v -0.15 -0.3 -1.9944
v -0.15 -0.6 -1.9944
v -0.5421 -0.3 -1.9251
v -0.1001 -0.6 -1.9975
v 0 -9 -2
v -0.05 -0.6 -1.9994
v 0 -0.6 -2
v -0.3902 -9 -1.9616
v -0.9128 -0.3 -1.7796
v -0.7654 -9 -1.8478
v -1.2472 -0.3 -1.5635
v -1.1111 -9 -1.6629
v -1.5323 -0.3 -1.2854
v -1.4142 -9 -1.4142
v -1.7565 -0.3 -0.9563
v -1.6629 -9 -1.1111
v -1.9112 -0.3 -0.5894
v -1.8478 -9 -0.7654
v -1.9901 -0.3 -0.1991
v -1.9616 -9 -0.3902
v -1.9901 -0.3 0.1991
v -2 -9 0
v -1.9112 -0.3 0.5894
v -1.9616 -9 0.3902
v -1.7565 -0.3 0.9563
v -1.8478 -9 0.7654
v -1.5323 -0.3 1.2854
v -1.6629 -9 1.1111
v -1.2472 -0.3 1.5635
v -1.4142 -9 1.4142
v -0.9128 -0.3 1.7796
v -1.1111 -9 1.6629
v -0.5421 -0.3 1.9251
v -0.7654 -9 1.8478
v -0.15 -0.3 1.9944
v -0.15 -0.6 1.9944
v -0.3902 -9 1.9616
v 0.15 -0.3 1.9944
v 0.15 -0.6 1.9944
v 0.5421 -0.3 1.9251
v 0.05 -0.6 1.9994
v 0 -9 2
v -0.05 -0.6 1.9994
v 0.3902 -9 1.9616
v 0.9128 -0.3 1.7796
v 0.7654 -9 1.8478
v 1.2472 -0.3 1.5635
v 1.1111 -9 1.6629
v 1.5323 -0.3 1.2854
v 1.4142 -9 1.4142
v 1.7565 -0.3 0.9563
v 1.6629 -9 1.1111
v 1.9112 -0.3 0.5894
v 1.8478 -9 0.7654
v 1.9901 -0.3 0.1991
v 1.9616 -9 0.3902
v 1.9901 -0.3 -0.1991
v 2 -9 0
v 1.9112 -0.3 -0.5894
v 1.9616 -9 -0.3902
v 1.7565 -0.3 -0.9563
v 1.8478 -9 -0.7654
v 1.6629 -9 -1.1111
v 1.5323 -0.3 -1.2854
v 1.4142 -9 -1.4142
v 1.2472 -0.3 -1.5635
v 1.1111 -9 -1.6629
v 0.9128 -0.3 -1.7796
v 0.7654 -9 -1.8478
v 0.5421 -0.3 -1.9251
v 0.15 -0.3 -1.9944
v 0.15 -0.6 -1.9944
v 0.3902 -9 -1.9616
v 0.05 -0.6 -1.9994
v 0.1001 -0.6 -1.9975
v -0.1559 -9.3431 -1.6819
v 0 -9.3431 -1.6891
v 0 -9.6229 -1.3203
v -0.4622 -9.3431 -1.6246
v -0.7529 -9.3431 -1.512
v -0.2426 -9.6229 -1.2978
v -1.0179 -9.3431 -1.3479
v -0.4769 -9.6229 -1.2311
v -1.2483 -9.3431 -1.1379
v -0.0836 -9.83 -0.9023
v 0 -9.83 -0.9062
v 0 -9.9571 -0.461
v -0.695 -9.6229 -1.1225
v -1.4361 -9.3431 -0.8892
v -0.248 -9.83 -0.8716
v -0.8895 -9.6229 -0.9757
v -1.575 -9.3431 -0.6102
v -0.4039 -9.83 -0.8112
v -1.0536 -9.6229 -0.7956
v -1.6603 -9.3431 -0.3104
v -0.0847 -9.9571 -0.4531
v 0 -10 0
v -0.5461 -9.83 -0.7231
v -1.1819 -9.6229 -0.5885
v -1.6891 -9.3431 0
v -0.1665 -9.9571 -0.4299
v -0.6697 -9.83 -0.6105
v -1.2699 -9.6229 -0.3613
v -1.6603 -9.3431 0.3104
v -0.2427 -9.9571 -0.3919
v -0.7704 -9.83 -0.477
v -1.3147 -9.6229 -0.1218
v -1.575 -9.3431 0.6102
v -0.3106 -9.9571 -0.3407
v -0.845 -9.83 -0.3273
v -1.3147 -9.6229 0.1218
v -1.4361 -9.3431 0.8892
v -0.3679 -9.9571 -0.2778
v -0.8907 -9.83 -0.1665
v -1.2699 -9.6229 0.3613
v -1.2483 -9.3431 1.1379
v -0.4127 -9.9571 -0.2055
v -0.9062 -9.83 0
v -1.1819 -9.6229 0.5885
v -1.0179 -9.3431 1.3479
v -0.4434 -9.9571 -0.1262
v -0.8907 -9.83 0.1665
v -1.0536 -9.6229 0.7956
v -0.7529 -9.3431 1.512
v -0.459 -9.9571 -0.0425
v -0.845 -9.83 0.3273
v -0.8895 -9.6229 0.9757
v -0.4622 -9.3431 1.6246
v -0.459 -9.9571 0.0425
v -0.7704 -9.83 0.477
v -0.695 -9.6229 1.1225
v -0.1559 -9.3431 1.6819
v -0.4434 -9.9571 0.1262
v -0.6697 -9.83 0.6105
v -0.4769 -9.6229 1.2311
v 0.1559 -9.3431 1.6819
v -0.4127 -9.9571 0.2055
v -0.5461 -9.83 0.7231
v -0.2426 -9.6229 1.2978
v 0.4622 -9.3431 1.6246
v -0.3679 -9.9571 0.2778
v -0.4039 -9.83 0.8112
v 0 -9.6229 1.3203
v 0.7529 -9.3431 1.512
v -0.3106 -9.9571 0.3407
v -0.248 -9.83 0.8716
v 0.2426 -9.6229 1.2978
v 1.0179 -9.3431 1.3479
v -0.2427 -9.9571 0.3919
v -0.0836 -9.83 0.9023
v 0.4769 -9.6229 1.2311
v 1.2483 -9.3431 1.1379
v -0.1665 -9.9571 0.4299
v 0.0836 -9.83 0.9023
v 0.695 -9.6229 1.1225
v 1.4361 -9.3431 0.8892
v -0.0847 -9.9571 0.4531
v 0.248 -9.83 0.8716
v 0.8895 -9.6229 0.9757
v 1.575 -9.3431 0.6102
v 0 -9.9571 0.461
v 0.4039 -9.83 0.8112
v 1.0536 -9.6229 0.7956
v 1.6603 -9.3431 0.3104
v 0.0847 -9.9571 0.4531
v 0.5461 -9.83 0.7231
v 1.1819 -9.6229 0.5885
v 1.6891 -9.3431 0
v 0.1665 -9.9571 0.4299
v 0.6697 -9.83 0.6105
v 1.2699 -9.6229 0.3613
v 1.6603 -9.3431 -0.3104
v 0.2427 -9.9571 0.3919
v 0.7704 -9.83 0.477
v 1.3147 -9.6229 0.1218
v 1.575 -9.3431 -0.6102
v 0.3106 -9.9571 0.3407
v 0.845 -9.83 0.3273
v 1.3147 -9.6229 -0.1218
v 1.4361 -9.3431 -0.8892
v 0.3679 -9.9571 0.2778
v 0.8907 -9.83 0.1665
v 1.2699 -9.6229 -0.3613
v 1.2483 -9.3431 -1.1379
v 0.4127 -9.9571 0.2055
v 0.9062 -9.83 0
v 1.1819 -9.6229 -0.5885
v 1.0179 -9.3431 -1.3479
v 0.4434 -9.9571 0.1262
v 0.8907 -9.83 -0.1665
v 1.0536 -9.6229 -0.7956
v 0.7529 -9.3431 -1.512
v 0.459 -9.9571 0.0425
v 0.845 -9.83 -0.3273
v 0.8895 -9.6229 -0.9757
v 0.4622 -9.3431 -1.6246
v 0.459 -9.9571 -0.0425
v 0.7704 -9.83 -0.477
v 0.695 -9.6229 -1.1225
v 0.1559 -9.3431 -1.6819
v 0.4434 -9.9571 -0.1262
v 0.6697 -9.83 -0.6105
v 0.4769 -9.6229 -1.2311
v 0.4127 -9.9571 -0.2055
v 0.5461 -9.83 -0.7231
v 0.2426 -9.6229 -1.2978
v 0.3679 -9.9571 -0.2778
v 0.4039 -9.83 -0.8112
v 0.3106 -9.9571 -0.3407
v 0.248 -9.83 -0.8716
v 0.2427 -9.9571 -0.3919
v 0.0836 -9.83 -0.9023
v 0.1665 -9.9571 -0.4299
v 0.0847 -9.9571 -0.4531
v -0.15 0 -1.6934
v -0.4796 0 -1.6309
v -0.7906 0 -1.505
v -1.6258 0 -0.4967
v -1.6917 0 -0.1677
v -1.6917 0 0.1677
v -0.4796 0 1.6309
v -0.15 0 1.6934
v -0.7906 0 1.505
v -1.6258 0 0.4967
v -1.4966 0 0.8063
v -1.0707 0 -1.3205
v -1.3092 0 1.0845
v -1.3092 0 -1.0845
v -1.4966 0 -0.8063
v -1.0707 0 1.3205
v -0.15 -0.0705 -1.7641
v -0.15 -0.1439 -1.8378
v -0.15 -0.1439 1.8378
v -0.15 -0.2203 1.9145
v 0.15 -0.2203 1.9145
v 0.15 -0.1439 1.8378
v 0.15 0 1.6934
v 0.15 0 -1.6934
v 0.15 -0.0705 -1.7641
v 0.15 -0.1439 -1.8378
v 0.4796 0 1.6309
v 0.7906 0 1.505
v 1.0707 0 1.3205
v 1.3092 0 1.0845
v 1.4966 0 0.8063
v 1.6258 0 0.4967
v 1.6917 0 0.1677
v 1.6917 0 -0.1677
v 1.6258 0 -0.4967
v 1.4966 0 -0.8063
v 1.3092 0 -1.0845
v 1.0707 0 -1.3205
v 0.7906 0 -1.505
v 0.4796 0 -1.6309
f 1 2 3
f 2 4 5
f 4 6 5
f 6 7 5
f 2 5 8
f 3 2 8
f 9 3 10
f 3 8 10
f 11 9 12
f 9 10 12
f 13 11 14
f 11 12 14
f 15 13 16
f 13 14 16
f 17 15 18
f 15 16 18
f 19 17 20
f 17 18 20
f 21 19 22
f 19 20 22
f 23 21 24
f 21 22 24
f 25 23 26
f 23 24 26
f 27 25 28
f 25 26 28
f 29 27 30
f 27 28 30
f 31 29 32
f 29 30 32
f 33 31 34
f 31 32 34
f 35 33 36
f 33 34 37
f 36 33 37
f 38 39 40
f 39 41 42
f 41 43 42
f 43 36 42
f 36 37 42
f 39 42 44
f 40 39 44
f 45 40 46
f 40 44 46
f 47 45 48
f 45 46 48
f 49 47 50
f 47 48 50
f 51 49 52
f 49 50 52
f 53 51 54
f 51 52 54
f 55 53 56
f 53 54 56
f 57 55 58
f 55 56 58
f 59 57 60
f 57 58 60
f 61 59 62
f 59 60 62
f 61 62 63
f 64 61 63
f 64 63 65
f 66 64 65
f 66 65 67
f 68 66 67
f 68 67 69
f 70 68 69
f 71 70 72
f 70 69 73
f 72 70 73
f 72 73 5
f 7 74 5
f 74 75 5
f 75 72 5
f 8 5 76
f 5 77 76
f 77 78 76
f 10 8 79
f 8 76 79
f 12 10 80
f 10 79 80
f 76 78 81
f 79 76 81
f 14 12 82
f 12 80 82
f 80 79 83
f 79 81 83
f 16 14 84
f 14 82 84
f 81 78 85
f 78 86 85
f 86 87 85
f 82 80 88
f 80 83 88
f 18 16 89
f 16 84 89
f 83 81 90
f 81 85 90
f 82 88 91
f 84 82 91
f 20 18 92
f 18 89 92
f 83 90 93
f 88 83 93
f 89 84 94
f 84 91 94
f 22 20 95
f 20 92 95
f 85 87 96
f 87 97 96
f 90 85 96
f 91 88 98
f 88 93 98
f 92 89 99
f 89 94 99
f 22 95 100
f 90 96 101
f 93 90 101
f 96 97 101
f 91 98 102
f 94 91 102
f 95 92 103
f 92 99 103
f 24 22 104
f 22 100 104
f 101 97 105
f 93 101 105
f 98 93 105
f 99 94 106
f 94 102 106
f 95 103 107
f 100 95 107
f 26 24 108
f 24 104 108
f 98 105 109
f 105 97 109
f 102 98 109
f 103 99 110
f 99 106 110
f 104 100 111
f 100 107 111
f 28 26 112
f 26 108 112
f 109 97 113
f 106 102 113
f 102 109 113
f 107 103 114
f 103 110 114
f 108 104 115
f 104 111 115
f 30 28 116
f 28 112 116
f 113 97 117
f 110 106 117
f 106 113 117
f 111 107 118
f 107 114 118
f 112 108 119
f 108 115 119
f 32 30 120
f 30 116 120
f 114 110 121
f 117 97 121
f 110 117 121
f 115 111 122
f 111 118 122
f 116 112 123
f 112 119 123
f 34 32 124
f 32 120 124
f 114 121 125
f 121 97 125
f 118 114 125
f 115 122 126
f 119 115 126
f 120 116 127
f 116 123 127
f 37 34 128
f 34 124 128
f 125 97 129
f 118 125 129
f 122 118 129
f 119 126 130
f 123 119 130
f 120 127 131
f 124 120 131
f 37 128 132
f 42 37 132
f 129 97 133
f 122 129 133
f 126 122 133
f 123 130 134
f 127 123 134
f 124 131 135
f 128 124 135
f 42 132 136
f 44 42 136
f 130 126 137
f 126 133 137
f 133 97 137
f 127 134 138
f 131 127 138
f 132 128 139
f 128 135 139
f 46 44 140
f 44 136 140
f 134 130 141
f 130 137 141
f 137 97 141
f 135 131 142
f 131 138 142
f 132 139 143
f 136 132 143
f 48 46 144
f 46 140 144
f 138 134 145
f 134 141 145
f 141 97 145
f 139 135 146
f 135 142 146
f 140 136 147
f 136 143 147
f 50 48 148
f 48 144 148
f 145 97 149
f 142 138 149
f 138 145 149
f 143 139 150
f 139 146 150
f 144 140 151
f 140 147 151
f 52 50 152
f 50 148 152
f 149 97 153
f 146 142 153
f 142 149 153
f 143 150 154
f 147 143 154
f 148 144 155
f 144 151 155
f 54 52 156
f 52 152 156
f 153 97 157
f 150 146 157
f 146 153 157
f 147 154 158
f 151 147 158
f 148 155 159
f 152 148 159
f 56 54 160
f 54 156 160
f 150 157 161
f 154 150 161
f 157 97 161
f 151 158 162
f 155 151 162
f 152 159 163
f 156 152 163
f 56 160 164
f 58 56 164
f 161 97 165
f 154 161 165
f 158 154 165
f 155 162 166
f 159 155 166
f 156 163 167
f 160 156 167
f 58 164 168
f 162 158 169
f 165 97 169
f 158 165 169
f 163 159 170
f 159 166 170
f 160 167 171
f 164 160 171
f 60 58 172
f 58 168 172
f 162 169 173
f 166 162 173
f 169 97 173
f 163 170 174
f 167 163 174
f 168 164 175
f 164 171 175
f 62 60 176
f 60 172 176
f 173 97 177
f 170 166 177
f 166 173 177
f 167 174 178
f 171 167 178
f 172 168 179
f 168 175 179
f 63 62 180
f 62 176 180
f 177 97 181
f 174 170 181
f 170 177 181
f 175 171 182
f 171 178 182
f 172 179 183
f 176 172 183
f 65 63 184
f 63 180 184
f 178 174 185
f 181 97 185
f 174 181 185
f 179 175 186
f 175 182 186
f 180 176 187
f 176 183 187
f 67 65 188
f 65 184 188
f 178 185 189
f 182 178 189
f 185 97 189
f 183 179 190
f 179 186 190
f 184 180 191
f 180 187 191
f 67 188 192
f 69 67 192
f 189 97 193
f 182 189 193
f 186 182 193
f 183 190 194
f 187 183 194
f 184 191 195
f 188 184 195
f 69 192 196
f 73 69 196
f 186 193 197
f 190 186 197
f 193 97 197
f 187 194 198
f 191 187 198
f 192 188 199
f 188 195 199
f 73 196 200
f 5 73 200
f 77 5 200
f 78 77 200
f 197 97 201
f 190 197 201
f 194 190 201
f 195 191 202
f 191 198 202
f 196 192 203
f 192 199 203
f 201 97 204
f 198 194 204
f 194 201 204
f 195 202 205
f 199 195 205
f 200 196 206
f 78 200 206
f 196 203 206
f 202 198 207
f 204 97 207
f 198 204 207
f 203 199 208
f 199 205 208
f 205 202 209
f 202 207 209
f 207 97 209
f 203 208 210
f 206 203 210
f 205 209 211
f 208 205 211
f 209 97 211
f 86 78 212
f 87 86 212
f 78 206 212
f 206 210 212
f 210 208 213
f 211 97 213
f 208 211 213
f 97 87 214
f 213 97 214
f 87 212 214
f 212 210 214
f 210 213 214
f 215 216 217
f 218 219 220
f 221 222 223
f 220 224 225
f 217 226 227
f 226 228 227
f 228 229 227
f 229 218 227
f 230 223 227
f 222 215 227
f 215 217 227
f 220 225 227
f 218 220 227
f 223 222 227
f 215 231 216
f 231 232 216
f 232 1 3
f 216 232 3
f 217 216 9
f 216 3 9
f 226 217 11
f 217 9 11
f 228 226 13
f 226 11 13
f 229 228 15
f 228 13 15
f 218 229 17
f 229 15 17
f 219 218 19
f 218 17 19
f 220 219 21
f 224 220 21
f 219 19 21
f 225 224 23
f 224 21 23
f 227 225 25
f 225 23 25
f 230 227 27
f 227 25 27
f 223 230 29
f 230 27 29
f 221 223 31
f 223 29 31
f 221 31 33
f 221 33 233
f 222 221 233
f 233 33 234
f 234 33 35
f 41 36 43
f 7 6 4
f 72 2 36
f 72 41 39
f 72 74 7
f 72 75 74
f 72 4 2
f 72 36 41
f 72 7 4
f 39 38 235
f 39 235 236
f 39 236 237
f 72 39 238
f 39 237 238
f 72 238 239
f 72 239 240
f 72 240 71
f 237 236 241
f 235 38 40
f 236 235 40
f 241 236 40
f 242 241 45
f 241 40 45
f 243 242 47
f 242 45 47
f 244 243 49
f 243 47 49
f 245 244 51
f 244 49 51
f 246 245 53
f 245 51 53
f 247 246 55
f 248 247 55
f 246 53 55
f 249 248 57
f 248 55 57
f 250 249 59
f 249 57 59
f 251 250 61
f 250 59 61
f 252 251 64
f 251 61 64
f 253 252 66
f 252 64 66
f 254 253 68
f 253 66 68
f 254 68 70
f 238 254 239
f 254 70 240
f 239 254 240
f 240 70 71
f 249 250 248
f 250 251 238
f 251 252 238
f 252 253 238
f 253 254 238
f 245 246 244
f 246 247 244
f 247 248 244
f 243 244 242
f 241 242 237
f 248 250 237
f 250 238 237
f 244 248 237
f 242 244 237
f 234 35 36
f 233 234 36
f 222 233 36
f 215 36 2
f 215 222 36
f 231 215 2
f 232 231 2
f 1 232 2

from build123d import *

# Parameters (mm, degrees)
ESQUISSE2_W = 0.3
ESQUISSE2_H = 4
FENTE_DEPTH = 0.6


with BuildPart() as part:
    # Esquisse1 → Tige (revolve)
    with BuildSketch(Plane.XY):
        with BuildLine():
            Line((0, 0), (1.7, 0))
            Line((1.7, 0), (2, -0.3))
            Line((2, -0.3), (2, -9))
            ThreePointArc((2, -9), (1.118033989, -9.736067977), (0, -10))
            Line((0, -10), (0, 0))
        make_face()
    revolve(axis=Axis((0, 0, 0), (0, 1, 0)))

    # Esquisse2 → Fente (cut)
    with BuildSketch(Plane(origin=(0, 0, 0), x_dir=(1, 0, 0), z_dir=(0, 1, 0))):
        Rectangle(ESQUISSE2_W, ESQUISSE2_H)
    extrude(amount=-FENTE_DEPTH, mode=Mode.SUBTRACT)


solid = part.part
